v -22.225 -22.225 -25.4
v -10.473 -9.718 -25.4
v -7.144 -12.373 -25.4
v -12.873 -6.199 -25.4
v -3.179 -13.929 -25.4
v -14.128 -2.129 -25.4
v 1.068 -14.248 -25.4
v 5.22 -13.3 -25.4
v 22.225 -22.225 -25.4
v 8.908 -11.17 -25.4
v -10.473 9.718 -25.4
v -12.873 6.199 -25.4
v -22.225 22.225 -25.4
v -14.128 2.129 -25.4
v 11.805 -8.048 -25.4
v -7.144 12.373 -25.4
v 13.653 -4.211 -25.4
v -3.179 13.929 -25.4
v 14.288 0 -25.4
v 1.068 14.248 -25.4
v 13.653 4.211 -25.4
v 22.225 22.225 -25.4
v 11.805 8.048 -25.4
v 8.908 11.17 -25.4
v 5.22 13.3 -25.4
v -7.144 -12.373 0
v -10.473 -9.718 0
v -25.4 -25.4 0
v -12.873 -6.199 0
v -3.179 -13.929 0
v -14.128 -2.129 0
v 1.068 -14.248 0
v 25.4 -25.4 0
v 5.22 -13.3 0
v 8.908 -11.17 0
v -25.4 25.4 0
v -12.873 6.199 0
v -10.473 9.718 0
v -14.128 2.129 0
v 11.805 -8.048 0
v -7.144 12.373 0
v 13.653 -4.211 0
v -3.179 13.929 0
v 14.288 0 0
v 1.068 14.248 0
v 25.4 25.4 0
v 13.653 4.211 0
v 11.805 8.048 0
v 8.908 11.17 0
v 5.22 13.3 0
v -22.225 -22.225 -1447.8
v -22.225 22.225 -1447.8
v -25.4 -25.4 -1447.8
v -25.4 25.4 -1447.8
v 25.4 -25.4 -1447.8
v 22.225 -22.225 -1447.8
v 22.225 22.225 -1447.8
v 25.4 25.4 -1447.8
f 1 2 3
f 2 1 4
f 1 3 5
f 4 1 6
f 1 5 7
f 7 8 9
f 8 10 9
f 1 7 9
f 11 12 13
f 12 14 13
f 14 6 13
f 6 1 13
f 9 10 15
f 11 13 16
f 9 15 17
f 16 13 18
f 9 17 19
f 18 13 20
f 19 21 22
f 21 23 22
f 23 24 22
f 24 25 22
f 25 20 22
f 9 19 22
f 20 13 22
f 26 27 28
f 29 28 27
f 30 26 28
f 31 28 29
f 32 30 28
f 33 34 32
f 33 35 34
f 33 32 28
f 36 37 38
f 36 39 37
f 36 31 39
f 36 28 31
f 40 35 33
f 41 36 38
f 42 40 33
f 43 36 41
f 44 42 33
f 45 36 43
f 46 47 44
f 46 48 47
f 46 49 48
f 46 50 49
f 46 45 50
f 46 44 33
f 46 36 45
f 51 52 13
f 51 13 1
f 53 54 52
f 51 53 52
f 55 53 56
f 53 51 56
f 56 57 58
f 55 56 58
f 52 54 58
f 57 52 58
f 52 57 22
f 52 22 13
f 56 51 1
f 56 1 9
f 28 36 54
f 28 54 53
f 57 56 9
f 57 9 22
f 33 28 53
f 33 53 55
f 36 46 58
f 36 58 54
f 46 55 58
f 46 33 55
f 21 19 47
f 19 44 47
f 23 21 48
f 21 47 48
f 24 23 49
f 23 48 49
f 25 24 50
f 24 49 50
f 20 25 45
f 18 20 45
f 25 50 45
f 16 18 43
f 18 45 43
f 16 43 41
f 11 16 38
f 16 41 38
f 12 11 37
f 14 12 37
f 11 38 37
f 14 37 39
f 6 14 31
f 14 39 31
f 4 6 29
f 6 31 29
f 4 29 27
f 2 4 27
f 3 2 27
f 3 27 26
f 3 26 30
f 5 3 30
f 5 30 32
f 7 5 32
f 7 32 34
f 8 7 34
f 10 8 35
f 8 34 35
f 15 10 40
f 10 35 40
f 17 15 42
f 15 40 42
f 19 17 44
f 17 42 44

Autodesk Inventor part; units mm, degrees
ref_plane "YZ Plane" through (0, 0, 0) normal (1, 0, 0) x (0, 1, 0)
ref_plane "XZ Plane" through (0, 0, 0) normal (0, 1, 0) x (-1, 0, 0)
ref_plane "XY Plane" through (0, 0, 0) normal (0, 0, 1) x (1, 0, 0)
sketch "Sketch1" plane through (0, 0, 0) normal (0, 0, 1) x (1, 0, 0)
  line L0 (-25.4, -25.4) -> (25.4, -25.4)
  line L1 (25.4, -25.4) -> (25.4, 25.4)
  line L2 (25.4, 25.4) -> (-25.4, 25.4)
  line L3 (-25.4, 25.4) -> (-25.4, -25.4)
  line L4 (-25.4, -25.4) -> (25.4, 25.4) construction
  line L5 (25.4, -25.4) -> (-25.4, 25.4) construction
  line L6 (-22.225, -22.225) -> (22.225, -22.225)
  line L7 (22.225, -22.225) -> (22.225, 22.225)
  line L8 (22.225, 22.225) -> (-22.225, 22.225)
  line L9 (-22.225, 22.225) -> (-22.225, -22.225)
  line L10 (-22.225, -22.225) -> (22.225, 22.225) construction
  line L11 (22.225, -22.225) -> (-22.225, 22.225) construction
  point P0 (0, 0)
  dimension "d0" = 50.8
  dimension "d1" = 50.8
  dimension "d2" = 3.175
  dimension "d3" = 3.175
extrude "Extrusion1" add sketch "Sketch1" against normal blind 1447.8
sketch "Sketch2" plane through (0, 0, 0) normal (0, 0, 1) x (1, 0, 0)
  circle A0 centre (0, 0) radius 14.2875
  line L0 (-22.225, -22.225) -> (22.225, -22.225)
  line L1 (22.225, -22.225) -> (22.225, 22.225)
  line L2 (22.225, 22.225) -> (-22.225, 22.225)
  line L3 (-22.225, 22.225) -> (-22.225, -22.225)
  line L4 (-22.225, -22.225) -> (22.225, 22.225) construction
  line L5 (22.225, -22.225) -> (-22.225, 22.225) construction
  dimension "d6" = 28.575
extrude "Extrusion2" add sketch "Sketch2" against normal blind 25.4
properties part number "2x2x1_8_tubeForLift" material "Aluminum 6061"
